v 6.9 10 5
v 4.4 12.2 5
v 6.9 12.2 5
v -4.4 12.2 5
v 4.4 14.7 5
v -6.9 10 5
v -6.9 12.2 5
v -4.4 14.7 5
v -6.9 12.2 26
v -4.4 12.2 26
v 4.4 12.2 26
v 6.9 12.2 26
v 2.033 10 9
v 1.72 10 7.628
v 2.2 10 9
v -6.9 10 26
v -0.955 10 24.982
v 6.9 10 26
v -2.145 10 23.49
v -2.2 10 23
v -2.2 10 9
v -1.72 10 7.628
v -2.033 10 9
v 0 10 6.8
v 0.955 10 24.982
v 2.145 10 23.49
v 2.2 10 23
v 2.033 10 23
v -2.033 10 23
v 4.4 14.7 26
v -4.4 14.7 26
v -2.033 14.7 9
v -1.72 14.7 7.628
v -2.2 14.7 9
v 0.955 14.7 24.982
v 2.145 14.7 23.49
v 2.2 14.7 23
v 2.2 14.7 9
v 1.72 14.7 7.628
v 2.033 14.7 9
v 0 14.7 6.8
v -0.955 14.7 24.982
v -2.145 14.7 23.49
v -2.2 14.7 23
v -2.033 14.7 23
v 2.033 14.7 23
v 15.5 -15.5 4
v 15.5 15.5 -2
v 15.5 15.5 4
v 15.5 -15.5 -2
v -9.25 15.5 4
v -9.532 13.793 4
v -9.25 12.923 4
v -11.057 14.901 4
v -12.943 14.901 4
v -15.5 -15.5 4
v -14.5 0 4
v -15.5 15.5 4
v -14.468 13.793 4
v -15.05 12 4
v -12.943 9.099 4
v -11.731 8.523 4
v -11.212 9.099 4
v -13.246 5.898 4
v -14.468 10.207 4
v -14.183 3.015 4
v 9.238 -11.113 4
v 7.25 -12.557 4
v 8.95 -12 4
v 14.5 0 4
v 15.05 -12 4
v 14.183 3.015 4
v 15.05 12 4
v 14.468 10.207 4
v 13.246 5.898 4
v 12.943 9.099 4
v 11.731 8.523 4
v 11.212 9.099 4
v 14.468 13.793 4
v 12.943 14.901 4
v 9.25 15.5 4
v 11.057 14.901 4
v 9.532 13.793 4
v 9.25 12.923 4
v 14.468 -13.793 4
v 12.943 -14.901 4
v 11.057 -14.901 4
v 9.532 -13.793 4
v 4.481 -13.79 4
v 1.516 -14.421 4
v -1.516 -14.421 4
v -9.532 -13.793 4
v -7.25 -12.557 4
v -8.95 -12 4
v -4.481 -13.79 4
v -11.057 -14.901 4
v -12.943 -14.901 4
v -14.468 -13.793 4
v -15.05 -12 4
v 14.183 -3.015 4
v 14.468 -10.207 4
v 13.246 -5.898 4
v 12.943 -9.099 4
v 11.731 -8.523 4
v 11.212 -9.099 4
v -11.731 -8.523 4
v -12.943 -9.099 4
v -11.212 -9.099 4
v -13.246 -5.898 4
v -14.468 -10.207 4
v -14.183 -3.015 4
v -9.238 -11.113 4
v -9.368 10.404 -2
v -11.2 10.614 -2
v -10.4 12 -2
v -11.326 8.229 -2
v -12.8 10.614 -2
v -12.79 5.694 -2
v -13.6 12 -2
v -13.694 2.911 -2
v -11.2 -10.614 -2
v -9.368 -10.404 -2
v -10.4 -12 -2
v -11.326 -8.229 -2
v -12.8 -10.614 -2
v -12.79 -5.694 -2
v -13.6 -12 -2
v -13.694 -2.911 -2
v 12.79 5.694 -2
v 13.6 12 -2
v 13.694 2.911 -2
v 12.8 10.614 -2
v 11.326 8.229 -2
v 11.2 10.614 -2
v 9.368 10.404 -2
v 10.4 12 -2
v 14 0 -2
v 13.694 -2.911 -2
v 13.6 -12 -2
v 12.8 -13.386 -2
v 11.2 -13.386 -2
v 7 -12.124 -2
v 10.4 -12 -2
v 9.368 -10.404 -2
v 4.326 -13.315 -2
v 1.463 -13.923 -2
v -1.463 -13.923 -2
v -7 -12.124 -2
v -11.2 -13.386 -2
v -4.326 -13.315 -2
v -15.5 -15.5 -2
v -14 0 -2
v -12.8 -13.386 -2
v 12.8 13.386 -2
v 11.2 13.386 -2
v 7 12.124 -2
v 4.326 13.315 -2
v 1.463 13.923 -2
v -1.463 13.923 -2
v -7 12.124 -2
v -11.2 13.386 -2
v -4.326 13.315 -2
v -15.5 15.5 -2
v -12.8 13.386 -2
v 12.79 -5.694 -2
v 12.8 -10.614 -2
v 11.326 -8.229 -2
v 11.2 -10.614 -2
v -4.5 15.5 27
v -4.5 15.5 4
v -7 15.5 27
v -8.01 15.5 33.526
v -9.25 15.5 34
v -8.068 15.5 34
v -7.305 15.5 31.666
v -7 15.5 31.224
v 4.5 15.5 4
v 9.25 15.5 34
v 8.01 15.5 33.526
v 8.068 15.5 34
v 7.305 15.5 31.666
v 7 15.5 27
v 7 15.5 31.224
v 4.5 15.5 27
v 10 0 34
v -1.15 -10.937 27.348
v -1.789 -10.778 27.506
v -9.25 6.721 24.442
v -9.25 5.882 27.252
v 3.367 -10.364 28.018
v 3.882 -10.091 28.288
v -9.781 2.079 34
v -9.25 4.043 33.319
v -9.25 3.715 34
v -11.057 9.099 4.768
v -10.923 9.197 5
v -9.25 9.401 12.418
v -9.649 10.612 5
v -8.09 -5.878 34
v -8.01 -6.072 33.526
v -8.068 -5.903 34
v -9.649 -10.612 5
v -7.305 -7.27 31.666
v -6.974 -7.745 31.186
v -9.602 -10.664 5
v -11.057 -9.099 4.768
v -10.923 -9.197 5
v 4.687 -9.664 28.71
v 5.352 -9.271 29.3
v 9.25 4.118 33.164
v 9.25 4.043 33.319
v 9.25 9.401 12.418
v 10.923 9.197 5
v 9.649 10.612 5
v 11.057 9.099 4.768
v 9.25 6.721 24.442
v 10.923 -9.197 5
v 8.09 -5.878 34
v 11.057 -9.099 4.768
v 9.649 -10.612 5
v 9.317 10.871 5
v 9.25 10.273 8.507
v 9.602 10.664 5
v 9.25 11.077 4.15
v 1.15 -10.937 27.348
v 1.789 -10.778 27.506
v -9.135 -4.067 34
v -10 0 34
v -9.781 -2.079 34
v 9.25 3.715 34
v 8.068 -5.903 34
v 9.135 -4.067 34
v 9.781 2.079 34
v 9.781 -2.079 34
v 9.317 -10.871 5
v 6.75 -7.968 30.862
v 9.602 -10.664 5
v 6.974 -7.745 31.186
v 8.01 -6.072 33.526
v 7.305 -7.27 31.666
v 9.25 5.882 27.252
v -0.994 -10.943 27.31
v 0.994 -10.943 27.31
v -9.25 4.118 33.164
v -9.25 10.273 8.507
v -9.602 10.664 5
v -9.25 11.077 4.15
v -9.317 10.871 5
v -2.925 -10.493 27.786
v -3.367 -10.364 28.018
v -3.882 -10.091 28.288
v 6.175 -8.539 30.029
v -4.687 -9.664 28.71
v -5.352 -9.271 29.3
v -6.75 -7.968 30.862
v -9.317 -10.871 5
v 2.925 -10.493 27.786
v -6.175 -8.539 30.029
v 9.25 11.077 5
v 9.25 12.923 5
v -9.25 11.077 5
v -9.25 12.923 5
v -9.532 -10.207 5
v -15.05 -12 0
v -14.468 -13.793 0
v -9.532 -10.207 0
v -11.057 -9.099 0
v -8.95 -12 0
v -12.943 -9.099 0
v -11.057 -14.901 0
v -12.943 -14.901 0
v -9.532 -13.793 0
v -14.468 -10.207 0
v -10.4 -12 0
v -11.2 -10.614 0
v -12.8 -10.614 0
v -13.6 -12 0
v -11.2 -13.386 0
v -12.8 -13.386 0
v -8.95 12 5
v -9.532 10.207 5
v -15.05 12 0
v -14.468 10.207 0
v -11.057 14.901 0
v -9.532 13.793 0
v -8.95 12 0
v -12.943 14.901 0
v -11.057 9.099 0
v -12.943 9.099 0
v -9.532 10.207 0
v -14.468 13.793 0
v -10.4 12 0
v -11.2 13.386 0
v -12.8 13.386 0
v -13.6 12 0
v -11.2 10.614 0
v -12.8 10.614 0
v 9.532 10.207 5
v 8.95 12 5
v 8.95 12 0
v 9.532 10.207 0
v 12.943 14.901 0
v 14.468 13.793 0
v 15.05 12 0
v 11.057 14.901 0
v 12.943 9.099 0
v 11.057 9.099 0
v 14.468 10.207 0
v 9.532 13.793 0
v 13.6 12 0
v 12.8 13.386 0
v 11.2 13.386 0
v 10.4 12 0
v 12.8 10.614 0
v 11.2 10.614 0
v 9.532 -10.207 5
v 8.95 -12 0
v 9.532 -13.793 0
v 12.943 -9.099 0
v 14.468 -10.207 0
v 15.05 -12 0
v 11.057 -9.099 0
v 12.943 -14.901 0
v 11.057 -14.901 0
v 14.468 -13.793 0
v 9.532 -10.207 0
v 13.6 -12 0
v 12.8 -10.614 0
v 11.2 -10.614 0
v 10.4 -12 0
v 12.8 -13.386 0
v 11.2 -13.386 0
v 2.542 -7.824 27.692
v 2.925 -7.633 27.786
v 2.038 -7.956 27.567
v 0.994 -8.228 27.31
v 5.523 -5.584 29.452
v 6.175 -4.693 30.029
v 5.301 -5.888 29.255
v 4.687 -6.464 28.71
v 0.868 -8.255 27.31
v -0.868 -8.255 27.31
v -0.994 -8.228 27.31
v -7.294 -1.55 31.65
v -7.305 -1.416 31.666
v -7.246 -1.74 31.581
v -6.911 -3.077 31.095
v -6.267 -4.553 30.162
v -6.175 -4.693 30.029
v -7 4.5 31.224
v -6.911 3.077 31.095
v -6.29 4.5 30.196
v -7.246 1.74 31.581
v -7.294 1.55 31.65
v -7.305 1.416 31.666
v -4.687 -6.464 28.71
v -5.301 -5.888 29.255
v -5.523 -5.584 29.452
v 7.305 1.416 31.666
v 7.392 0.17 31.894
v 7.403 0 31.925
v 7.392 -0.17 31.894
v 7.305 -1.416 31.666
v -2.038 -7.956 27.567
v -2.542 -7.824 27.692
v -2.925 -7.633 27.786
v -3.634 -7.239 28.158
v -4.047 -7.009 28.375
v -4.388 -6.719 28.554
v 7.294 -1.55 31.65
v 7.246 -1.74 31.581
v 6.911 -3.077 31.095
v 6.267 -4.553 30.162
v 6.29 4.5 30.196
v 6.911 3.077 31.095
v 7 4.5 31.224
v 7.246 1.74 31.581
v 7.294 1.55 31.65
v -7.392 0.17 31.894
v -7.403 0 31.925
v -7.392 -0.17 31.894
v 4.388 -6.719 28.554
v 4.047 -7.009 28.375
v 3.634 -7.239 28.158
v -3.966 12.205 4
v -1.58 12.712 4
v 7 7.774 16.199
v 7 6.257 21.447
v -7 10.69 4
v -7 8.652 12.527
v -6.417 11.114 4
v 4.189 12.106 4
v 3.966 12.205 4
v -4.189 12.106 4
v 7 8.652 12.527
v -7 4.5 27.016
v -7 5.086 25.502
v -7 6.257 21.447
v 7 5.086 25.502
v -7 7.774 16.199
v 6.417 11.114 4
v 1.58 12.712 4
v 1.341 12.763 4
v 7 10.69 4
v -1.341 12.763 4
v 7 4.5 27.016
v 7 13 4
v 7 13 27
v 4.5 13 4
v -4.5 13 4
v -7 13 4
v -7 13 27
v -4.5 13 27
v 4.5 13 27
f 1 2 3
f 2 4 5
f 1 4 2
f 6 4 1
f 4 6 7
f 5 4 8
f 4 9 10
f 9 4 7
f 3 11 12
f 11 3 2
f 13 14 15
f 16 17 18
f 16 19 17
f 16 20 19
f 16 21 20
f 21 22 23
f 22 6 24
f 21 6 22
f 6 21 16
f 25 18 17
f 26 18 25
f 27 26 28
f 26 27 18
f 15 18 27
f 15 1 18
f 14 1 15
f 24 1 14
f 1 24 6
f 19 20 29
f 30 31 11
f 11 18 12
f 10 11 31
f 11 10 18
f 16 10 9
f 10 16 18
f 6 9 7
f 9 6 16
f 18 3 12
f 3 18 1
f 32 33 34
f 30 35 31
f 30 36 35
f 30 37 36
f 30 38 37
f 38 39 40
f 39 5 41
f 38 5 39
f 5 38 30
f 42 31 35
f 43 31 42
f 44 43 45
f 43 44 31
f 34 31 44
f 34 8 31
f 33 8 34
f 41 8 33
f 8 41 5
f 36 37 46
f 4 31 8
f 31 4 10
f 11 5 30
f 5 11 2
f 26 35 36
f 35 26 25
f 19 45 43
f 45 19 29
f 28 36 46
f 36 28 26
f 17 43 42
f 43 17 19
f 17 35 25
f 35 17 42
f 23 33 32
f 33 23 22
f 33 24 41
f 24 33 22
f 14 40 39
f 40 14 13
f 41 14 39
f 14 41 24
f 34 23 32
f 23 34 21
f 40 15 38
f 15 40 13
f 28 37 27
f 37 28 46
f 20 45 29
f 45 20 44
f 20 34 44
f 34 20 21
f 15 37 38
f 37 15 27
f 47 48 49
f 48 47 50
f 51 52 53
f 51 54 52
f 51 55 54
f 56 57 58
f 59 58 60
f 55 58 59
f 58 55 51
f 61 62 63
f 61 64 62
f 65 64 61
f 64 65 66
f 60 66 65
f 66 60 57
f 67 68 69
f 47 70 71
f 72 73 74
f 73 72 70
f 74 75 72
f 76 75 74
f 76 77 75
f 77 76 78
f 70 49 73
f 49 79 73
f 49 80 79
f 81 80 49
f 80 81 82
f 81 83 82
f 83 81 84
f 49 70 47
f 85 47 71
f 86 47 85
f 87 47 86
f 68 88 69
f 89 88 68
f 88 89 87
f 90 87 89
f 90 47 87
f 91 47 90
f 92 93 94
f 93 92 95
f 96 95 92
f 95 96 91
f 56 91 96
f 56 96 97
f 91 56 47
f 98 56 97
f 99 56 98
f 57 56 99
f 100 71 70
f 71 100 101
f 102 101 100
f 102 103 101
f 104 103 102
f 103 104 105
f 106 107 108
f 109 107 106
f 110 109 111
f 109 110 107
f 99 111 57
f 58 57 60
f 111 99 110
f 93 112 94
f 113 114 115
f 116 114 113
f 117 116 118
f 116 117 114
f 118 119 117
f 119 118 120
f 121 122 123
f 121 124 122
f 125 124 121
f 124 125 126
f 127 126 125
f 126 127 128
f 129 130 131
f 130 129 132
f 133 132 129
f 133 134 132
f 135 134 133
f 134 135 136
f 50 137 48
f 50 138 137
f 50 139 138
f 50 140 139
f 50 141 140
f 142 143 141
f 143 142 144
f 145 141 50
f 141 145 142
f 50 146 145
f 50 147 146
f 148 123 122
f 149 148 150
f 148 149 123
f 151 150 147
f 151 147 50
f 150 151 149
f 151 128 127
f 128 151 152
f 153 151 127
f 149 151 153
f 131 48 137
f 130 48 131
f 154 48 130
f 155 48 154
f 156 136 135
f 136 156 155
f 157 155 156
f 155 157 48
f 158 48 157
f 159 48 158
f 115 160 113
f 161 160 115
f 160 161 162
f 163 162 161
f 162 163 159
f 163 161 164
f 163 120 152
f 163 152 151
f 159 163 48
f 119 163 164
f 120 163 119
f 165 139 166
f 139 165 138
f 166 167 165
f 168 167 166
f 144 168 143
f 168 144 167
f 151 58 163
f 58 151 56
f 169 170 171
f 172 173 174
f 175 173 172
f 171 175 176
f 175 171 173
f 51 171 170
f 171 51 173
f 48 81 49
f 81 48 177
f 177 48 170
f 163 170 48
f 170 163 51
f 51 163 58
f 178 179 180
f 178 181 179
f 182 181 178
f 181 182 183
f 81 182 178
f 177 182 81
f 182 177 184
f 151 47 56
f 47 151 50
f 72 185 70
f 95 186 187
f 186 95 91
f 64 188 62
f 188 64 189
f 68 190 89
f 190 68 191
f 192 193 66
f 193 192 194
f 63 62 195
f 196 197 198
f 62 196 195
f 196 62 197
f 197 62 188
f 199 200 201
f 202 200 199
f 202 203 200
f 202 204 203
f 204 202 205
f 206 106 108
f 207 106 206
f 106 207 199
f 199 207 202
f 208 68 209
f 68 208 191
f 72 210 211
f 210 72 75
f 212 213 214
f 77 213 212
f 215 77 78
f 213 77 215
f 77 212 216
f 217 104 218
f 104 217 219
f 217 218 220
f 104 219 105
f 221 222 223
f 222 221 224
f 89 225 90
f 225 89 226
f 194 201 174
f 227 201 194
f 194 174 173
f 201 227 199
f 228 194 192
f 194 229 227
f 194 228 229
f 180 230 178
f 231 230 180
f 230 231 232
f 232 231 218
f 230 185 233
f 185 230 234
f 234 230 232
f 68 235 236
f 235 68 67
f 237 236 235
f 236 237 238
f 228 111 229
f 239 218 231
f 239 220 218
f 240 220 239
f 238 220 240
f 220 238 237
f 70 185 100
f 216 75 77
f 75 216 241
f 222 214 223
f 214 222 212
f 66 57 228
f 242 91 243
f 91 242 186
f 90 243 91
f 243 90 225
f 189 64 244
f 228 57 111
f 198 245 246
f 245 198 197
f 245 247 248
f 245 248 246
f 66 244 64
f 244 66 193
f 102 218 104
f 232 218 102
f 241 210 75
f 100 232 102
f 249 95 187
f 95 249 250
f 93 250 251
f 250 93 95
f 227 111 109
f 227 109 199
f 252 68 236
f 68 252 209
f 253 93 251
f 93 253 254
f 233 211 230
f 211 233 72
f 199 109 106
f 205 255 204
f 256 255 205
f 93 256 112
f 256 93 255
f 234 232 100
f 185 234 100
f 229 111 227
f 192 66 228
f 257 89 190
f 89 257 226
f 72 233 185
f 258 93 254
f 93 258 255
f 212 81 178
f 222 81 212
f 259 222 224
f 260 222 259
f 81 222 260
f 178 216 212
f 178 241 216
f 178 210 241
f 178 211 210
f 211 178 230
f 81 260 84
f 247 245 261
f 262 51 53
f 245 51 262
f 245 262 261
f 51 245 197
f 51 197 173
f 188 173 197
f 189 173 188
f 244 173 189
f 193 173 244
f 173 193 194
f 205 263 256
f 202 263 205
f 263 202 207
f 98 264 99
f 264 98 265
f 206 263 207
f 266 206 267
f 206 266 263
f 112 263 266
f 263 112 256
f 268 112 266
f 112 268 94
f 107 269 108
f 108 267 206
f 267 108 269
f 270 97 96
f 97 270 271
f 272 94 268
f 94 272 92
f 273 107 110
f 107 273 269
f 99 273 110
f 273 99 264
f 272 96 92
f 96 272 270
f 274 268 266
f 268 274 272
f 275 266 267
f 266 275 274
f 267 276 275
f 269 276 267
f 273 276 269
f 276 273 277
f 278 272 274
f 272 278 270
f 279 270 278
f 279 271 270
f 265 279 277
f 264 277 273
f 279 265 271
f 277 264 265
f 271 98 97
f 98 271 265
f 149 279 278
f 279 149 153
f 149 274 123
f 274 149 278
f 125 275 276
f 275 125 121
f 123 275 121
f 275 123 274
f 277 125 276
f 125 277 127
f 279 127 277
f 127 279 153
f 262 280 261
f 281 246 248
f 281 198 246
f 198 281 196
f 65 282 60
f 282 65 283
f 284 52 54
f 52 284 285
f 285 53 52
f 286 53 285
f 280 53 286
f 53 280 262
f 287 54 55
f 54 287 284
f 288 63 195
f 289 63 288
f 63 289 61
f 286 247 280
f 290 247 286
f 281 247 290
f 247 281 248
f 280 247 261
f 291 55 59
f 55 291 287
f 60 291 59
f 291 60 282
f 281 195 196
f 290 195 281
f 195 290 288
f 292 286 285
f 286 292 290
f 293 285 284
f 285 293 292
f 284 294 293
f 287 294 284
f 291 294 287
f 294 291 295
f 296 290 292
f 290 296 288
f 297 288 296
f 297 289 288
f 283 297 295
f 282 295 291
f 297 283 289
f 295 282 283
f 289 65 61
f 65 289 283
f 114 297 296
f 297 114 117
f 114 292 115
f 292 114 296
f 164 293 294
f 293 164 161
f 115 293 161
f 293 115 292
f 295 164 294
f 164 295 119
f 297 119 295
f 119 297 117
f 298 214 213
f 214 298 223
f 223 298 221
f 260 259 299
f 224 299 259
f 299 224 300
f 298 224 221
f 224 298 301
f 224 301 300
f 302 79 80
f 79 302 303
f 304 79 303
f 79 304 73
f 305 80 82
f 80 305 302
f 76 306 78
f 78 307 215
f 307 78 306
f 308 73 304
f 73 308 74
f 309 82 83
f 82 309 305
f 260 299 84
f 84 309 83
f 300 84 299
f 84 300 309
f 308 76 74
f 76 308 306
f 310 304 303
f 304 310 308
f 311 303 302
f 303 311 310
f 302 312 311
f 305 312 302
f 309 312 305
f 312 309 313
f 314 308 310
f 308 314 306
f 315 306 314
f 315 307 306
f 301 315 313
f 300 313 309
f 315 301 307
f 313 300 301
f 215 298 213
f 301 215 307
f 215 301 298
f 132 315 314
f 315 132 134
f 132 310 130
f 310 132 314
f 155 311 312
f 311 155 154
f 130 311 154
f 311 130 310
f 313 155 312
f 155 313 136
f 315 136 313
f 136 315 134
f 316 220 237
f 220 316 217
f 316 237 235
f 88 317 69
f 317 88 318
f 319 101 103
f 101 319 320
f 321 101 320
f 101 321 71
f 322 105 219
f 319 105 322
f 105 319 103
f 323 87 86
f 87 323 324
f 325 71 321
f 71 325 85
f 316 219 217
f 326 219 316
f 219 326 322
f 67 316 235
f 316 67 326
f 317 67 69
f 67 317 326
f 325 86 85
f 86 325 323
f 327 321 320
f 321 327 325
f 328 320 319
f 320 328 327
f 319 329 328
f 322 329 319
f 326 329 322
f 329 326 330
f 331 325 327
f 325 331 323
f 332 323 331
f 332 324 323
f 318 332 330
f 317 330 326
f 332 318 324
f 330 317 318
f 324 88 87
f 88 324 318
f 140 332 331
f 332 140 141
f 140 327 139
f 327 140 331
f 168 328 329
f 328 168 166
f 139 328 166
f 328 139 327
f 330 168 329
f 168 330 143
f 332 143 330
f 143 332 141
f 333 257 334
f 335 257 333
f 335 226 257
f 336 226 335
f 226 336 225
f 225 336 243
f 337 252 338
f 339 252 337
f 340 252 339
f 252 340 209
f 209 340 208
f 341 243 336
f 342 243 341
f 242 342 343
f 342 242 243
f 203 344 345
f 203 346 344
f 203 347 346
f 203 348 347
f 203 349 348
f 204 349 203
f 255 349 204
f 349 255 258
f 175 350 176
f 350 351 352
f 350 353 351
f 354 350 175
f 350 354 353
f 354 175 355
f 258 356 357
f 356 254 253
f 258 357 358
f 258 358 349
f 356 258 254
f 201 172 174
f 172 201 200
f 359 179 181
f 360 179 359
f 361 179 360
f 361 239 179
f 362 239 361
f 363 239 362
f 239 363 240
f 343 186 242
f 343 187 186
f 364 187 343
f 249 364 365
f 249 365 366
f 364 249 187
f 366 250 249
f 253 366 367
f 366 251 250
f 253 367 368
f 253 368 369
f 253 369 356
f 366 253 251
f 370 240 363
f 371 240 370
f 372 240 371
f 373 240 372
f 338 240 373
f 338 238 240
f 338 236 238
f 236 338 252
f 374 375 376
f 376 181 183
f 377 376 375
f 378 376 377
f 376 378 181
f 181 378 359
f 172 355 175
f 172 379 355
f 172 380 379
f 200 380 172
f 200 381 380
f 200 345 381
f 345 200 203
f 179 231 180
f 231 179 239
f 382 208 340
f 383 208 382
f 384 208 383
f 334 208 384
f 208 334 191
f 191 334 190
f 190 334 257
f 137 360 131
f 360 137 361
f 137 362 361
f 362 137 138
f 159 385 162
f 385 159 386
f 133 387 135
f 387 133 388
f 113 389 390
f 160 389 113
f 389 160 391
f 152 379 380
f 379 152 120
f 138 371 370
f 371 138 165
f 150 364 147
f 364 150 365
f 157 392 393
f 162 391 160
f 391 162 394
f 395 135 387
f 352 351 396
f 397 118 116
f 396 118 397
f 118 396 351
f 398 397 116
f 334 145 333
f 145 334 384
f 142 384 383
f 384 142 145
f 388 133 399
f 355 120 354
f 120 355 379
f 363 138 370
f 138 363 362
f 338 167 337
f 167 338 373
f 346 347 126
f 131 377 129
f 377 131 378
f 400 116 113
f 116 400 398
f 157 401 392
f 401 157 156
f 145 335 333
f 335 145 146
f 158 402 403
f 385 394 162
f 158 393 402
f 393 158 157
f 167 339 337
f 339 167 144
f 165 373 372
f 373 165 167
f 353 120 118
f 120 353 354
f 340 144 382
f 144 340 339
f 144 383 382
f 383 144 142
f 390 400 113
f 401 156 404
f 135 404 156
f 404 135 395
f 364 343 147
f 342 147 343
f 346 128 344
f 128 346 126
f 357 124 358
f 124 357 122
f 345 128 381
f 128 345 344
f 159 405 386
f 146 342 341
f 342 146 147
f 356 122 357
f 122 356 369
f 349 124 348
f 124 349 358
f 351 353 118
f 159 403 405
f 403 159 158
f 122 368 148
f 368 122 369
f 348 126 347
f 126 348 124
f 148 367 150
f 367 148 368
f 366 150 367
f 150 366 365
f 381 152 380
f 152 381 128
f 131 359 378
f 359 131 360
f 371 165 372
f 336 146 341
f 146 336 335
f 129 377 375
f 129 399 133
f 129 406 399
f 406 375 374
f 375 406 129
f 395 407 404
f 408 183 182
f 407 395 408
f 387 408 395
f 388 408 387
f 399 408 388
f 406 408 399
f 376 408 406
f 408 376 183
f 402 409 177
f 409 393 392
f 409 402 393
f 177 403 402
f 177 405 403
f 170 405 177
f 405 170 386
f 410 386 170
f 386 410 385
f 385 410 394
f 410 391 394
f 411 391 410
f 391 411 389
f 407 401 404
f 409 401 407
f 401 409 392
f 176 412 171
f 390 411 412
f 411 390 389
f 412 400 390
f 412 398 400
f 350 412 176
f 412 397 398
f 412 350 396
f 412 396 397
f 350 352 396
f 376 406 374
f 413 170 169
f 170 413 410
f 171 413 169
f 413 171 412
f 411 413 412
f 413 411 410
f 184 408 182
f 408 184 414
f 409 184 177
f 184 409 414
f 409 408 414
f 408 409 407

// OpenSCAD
module Soporte(){
		cube([21,13.8,2.2]);
		translate([0, 2.5, 2.2])
			cube([21,8.8,2.5]);
}


translate([6.9, 10, 26]){
rotate([0, 90, 90]){

difference (){

		Soporte();
		translate([3, 6.9, 0])
			cylinder(r=4.4/2, h=5, $f=100);
		translate([17, 6.9, 0])
			cylinder(r=4.4/2, h=5, $f=100);
		translate([3, 4.7, 0])
			cube([14,4.4,5]);
}

}
}





module base()
{
	translate ([-15.5, -15.5, -2]){
		cube([31,31,6]);
	}

	translate ([0, 0, 4]){
		cylinder(r1 = 29/2, r2 = 20/2, h = 30);
	}
	translate ([-9.25, 0, 4]){
		cube([18.5,15.5,30]);
	}
}



module fusor()
{
	translate([0, 0, 35.5])
	rotate ([90, 0, 0]){
		cylinder(r=16.5/2, h=40, $f=100, center = true);
	}
}

union(){

//Guias para el soporte
	translate ([-7, 13, 4]){
		cube([2.5,2.5,23]);
	}

	translate ([4.5, 13, 4]){
		cube([2.5,2.5,23]);
	}

difference(){

	base();
	fusor();

//Huecos para los tornillos que sujetan el ventilador
	translate ([-12, -12, 0]){
		cylinder(r=6.1/2, h=5, $f=6);
	translate([0,0,-3])
		cylinder(r=3.2/2, h=3, $f=100);
	}

	translate ([-12, 12, 0]){
		cylinder(r=6.1/2, h=5, $f=6);
	translate([0,0,-3])
		cylinder(r=3.2/2, h=3, $f=100);
	}


	translate ([12, 12, 0]){
		cylinder(r=6.1/2, h=5, $f=6);
	translate([0,0,-3])
		cylinder(r=3.2/2, h=3, $f=100);
	}

	translate ([12, -12, 0]){
		cylinder(r=6.1/2, h=5, $f=6);
	translate([0,0,-3])
		cylinder(r=3.2/2, h=3, $f=100);
	}

//Canal para la ventilación
	translate ([0, 0, -2]){
		cylinder(r1 = 28/2, r2 = 14/2, h = 36);
	}

	translate ([-7, 4.5, 4]){
		cube([14,13,50]);
	}

}
}
